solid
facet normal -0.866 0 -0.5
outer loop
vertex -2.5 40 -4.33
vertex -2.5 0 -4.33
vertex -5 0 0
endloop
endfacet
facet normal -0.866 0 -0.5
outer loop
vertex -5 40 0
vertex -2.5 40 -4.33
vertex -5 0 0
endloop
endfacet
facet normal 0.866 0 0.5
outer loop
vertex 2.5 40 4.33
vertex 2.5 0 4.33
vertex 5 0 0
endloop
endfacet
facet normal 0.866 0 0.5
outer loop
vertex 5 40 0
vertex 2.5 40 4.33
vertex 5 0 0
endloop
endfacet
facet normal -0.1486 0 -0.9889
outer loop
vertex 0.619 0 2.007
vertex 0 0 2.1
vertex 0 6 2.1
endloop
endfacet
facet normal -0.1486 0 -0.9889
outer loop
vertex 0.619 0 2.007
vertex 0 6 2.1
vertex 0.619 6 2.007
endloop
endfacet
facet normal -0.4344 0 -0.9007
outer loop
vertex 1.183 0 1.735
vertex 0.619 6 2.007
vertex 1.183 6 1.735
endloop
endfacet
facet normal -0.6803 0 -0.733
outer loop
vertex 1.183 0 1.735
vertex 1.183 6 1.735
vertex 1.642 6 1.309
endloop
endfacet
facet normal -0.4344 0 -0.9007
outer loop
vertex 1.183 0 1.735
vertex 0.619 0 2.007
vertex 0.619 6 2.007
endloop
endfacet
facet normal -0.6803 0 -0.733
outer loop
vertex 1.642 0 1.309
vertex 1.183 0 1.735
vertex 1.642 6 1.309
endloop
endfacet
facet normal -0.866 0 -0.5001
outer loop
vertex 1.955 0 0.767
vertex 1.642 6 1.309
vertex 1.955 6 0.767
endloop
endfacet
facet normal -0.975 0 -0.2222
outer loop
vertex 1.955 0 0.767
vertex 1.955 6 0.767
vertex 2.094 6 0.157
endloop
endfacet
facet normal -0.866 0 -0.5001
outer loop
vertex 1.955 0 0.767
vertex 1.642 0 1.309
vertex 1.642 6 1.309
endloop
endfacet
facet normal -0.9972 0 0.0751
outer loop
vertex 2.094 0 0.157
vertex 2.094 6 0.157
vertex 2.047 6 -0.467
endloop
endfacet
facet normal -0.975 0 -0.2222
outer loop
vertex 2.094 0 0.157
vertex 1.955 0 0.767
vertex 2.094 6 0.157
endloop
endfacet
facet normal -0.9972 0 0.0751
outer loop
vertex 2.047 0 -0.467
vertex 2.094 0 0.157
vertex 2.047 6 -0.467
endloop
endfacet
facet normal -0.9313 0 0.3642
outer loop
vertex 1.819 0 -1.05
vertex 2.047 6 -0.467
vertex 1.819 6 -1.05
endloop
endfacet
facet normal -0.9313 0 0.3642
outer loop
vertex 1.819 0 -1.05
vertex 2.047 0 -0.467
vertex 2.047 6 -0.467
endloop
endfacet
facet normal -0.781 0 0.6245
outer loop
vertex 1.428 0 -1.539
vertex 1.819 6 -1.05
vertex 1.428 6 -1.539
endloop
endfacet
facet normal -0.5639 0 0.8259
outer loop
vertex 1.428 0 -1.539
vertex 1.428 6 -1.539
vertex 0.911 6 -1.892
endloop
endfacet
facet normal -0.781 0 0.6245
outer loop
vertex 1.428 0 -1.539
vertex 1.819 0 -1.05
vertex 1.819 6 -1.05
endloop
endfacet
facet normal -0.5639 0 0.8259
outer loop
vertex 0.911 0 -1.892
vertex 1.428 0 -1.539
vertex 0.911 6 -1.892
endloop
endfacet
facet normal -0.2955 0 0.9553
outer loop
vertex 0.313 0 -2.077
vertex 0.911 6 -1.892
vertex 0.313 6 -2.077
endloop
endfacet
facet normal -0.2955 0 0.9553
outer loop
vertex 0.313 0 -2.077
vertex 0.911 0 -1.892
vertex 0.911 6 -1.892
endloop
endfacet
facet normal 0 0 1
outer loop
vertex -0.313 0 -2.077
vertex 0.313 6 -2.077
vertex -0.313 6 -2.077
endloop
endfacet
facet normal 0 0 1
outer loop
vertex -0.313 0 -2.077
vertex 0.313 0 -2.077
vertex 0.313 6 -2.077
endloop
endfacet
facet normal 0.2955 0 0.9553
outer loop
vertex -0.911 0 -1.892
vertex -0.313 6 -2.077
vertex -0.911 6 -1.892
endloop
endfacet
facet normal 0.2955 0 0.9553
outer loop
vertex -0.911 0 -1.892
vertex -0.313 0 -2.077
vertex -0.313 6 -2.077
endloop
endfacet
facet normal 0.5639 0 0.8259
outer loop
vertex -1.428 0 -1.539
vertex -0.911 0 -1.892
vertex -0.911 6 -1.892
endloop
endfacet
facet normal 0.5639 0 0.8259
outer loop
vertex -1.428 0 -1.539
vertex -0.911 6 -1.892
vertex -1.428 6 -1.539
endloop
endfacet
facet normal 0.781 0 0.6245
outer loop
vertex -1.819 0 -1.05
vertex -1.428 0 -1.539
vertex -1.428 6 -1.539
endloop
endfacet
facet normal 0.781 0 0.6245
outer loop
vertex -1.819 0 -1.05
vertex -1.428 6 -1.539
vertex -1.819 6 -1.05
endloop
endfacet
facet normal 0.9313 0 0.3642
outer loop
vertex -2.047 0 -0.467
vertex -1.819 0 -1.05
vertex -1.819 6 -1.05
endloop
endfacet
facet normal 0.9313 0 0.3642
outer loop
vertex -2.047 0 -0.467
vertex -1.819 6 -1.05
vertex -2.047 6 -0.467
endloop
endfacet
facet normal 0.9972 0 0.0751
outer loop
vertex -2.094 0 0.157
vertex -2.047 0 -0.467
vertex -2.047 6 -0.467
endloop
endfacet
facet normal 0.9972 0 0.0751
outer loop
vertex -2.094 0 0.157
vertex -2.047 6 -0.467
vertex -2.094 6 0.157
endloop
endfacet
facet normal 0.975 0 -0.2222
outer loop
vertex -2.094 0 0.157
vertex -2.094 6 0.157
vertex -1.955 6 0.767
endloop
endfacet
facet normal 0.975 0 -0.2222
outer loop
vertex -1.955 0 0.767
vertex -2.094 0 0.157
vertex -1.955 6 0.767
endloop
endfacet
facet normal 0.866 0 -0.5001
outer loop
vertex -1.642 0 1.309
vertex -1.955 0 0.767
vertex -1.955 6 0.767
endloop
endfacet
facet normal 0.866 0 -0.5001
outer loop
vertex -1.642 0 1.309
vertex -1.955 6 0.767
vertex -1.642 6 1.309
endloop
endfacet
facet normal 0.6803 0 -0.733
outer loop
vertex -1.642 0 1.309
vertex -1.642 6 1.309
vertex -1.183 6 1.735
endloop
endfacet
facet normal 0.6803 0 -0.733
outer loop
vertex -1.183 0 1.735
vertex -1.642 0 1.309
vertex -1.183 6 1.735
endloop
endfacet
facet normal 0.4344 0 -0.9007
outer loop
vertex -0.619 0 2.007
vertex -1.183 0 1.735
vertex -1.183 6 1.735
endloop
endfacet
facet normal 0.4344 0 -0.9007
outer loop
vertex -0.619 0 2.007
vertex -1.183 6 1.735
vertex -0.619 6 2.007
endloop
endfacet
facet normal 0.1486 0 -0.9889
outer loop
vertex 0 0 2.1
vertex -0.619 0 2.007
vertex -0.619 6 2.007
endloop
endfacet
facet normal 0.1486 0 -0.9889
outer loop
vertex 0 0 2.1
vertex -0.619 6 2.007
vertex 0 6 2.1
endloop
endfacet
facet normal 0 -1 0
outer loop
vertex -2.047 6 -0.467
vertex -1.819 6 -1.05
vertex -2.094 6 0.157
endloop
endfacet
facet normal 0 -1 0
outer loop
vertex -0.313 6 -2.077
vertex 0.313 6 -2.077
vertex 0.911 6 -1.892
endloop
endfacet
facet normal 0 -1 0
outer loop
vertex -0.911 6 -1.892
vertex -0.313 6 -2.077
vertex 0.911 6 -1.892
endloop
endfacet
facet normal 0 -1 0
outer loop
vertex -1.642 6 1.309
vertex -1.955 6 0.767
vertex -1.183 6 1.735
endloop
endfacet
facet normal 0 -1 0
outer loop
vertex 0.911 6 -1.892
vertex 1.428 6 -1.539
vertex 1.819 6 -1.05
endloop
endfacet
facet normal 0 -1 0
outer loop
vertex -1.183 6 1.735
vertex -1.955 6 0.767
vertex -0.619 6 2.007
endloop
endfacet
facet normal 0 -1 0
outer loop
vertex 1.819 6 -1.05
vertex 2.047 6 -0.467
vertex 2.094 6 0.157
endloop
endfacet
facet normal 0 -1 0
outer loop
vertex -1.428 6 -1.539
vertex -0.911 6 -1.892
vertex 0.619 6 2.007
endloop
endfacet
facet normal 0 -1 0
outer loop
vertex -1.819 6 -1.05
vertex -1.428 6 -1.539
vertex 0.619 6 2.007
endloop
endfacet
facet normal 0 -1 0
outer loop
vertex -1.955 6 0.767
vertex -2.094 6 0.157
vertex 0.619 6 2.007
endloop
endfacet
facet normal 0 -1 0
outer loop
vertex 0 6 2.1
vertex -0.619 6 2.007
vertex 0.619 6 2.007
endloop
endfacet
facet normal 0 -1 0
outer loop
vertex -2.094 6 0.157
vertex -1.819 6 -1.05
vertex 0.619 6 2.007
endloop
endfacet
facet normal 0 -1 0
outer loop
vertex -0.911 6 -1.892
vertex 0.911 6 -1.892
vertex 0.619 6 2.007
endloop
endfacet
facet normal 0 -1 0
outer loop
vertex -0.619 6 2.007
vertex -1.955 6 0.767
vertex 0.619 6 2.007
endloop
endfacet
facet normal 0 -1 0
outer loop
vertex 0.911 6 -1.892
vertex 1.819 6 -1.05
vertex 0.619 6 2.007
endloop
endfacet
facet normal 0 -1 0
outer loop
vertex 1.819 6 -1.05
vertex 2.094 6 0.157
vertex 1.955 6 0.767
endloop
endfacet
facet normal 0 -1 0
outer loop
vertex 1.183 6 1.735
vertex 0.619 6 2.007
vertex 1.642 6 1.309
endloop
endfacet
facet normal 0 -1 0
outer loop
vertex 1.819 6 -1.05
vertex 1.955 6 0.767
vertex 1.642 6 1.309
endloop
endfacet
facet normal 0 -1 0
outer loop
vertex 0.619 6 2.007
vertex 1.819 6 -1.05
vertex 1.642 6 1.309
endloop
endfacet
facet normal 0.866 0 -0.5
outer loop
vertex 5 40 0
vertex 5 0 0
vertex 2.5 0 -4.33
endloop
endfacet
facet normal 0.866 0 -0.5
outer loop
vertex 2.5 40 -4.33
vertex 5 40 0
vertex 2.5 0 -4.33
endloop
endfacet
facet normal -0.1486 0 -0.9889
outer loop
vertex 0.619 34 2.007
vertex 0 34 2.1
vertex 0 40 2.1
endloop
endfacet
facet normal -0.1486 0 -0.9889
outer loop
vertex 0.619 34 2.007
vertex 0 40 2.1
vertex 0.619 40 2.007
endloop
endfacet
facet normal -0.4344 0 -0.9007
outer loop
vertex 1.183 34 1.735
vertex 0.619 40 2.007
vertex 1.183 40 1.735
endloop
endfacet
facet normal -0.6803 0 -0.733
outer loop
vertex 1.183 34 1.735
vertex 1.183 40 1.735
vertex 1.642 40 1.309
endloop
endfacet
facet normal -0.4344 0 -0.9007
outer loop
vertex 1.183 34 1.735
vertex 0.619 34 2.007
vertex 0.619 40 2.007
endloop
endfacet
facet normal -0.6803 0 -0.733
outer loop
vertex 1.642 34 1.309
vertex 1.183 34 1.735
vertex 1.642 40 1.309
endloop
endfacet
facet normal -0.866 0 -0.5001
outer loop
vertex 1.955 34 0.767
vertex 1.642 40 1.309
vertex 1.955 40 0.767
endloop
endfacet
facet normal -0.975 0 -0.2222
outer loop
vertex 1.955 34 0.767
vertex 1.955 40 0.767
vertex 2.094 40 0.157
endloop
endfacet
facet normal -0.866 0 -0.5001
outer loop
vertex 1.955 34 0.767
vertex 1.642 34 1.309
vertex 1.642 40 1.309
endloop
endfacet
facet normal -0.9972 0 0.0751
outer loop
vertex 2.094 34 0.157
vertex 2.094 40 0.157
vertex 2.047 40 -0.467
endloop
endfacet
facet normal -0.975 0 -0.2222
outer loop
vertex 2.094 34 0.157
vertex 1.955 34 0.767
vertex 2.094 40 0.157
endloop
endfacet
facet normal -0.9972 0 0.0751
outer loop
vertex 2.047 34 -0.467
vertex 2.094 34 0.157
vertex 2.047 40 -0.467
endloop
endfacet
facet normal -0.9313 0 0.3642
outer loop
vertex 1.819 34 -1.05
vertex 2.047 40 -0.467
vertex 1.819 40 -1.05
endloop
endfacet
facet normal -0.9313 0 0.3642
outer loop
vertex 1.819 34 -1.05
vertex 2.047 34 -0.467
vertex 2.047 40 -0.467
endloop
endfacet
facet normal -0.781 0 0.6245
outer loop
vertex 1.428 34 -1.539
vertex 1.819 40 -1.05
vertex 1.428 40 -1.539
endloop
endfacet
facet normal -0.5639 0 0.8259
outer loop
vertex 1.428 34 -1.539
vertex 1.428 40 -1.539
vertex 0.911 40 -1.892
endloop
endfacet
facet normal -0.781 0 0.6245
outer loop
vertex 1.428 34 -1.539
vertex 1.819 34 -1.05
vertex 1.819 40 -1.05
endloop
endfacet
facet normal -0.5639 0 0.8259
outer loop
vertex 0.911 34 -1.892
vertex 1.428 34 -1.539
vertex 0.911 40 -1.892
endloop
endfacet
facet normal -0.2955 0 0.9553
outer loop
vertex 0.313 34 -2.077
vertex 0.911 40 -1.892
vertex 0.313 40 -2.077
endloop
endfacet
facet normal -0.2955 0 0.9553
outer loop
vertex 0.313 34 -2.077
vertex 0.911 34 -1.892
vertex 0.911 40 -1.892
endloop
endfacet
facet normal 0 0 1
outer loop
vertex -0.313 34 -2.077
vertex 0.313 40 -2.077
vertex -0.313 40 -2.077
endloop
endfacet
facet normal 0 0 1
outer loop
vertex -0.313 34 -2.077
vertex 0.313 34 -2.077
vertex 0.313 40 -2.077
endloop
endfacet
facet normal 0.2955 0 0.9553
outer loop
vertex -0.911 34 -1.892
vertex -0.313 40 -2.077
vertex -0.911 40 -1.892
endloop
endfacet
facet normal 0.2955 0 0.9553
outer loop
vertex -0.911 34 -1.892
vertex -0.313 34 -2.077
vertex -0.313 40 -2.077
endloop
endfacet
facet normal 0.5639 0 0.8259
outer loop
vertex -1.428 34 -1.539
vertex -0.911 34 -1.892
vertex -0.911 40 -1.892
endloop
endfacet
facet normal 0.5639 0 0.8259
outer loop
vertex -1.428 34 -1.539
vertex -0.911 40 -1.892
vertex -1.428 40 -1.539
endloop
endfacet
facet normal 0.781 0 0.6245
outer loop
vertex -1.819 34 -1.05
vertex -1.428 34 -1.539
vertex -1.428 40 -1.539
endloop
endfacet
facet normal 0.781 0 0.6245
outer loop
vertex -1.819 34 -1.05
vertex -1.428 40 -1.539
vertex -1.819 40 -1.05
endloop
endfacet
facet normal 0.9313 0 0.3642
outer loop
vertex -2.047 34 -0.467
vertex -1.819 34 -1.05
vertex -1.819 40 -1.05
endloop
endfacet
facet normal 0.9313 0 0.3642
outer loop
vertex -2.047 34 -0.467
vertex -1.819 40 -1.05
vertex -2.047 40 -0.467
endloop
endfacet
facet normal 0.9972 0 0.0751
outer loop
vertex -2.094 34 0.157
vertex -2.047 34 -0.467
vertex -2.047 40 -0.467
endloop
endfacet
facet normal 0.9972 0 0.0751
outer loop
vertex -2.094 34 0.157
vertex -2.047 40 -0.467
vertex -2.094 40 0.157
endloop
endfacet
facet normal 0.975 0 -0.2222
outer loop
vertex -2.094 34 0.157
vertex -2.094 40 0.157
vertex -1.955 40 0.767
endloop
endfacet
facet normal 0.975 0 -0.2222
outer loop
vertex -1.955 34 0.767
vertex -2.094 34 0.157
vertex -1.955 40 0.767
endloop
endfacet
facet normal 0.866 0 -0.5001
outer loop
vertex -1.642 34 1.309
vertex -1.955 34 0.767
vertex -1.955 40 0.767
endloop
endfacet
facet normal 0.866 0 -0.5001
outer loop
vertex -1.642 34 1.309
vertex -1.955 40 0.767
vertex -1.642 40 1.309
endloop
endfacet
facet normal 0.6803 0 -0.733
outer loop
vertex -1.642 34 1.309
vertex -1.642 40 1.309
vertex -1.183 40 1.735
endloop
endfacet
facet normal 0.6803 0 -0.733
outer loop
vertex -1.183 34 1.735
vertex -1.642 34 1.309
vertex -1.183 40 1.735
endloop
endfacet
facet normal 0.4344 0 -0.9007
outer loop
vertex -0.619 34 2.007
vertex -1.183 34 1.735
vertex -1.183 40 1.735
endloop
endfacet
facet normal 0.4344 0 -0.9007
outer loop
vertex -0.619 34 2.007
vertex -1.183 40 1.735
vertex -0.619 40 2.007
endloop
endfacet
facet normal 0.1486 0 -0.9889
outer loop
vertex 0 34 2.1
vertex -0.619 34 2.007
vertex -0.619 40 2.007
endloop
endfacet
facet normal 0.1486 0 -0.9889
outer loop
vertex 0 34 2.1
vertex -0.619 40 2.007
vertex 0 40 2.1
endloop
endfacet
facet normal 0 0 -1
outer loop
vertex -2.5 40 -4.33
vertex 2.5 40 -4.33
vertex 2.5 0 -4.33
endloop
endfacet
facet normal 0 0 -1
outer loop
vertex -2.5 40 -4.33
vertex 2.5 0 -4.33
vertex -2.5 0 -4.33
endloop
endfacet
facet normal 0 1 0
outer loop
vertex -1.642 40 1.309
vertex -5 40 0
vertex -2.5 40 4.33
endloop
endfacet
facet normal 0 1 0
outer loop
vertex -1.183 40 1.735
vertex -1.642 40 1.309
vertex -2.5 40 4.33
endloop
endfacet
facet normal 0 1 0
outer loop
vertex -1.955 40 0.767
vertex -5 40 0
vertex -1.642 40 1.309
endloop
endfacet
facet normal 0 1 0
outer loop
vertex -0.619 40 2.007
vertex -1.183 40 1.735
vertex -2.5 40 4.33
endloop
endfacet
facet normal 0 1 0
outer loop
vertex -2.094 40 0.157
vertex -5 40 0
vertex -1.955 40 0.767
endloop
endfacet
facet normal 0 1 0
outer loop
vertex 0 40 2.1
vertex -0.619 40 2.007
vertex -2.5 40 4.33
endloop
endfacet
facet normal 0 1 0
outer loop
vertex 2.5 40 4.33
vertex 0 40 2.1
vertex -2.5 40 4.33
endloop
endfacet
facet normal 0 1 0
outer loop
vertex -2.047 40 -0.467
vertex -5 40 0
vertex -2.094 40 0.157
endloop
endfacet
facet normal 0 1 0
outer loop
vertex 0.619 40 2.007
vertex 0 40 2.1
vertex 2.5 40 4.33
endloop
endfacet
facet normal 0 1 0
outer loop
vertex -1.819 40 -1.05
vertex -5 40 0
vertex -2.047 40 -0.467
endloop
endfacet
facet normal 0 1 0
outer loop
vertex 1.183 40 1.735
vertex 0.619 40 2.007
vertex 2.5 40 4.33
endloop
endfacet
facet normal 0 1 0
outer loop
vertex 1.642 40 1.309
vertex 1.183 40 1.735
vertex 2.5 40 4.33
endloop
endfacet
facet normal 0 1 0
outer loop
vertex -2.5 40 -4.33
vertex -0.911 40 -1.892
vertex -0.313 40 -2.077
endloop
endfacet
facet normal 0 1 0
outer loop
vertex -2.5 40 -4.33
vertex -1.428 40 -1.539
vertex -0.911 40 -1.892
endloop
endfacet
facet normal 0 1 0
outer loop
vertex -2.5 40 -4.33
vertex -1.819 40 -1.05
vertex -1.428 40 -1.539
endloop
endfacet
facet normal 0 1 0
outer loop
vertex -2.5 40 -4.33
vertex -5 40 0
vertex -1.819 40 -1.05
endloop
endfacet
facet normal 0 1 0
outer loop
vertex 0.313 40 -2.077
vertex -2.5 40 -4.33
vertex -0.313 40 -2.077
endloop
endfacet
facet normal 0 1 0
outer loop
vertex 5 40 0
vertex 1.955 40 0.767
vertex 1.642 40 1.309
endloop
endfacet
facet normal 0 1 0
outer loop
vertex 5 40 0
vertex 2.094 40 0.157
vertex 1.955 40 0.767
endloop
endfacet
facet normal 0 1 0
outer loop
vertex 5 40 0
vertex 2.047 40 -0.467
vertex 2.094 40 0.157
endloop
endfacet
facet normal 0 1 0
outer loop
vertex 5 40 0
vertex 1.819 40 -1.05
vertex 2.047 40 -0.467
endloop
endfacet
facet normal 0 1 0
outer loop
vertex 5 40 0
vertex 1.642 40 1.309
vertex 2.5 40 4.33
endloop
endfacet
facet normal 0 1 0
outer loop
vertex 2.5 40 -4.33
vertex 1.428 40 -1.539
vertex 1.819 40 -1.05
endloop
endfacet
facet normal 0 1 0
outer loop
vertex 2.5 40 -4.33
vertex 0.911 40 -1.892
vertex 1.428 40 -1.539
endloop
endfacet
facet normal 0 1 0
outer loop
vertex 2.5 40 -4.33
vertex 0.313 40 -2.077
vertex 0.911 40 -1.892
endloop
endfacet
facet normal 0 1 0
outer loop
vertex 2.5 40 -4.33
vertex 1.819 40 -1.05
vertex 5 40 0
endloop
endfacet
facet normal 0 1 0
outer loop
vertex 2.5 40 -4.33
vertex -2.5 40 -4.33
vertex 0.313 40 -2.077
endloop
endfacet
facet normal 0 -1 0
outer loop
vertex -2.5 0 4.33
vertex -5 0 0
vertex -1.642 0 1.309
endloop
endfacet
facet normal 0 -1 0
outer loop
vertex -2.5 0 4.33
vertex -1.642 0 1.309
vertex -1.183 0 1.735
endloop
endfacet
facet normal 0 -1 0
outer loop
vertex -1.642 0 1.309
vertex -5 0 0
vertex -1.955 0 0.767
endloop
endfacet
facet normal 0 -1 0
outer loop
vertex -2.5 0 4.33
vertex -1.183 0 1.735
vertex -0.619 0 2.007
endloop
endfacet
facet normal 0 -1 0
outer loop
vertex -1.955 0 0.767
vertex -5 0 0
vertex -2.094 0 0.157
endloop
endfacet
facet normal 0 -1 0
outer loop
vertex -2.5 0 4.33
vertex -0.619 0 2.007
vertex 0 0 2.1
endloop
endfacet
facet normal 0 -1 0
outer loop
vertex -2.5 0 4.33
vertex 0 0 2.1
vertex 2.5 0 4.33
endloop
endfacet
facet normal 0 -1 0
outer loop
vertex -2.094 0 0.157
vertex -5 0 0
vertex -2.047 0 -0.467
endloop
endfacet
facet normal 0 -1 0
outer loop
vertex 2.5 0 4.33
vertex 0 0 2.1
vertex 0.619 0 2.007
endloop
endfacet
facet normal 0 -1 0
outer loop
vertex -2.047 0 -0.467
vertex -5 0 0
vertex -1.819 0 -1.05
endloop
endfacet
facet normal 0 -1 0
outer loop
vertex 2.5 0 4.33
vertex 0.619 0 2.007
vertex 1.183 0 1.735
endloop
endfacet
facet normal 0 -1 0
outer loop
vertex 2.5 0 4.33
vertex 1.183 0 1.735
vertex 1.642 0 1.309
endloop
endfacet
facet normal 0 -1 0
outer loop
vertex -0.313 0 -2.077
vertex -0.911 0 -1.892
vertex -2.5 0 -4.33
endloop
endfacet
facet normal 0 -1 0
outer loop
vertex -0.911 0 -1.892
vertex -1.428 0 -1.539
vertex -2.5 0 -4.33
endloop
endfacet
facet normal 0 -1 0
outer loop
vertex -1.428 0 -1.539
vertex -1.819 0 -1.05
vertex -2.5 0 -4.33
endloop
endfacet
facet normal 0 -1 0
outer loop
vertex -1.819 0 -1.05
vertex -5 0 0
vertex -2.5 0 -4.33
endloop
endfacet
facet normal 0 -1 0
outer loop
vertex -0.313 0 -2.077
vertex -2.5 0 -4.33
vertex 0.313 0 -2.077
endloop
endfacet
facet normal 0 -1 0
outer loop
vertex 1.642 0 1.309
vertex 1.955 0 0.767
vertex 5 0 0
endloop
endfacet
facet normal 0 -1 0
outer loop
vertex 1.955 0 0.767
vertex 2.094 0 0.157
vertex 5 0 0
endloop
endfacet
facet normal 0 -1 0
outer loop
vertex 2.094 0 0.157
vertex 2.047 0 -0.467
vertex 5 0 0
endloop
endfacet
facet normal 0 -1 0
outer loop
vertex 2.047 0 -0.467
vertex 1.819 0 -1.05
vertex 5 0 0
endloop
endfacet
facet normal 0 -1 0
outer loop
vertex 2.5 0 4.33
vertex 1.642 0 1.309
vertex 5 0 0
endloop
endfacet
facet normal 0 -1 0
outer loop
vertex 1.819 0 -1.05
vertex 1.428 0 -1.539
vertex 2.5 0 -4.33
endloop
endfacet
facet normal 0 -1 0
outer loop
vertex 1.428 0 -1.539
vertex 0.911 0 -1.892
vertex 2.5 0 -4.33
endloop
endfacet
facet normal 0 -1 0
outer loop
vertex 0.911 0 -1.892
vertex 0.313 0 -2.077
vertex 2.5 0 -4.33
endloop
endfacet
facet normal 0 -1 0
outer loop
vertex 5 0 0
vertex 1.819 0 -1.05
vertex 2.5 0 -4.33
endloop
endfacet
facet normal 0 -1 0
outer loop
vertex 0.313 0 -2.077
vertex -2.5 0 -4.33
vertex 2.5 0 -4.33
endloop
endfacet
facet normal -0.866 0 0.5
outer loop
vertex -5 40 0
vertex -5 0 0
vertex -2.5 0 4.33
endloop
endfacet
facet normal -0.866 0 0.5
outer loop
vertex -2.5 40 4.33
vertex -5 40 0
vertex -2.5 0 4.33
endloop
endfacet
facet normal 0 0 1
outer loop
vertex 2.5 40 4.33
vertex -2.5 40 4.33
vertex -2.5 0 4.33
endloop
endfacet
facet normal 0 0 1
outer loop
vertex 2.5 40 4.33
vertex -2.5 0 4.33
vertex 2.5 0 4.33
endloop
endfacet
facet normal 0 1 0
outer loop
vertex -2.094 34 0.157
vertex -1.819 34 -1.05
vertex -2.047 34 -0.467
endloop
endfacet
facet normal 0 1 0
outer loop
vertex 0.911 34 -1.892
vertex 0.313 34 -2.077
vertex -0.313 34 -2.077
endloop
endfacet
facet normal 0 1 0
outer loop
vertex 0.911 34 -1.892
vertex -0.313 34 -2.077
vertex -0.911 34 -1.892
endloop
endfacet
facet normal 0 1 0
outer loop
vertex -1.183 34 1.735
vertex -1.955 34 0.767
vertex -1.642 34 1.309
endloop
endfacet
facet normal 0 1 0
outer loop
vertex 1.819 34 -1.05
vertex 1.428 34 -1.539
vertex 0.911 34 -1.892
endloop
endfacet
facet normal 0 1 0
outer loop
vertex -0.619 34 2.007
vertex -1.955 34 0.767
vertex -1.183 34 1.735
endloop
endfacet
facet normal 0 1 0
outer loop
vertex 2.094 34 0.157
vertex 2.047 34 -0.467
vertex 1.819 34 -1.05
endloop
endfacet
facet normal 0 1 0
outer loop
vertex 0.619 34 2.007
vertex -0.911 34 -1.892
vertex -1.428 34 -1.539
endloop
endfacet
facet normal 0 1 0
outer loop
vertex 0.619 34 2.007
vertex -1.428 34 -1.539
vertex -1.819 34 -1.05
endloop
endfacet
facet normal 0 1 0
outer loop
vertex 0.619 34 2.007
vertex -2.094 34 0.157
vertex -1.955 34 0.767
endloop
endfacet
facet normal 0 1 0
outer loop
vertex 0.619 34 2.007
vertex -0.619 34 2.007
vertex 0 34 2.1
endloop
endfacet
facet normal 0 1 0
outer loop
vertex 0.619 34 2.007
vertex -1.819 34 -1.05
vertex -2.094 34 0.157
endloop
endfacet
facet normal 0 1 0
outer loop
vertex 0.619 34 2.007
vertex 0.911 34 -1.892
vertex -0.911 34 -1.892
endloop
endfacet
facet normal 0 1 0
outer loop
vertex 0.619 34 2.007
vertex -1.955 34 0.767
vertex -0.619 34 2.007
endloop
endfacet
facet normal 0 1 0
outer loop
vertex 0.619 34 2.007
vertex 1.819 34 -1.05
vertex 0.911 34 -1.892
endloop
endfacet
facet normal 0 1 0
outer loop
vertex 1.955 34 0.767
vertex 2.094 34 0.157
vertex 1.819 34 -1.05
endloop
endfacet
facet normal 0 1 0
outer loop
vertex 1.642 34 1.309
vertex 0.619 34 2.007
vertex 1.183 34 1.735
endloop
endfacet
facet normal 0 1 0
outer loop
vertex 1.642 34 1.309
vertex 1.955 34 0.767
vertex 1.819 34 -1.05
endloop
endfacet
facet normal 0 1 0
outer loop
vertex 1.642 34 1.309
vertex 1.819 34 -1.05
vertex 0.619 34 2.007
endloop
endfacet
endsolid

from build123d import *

# Parameters (mm, degrees)
SKETCH1_R                = 2.1
BOSS_EXTRUDE1_DEPTH      = 40
BOSS_EXTRUDE3_DEPTH      = 14
BOSS_EXTRUDE3_DEPTH_BACK = 14
SKETCH2_R                = 2.1


with BuildPart() as part:
    # Sketch1 → Boss-Extrude1 (new body)
    with BuildSketch(Plane(origin=(0, 0, 0), x_dir=(1, 0, 0), z_dir=(0, 1, 0))):
        Polygon((5, 0), (2.5, 4.330127019), (-2.5, 4.330127019), (-5, 0), (-2.5, -4.330127019), (2.5, -4.330127019), align=None)
        with Locations(Location((0, 0, 0), (0, 0, 270))):
            Circle(SKETCH1_R, mode=Mode.SUBTRACT)
    extrude(amount=BOSS_EXTRUDE1_DEPTH)

    # Sketch2 → Boss-Extrude3 (add, two sides: drawn at the far end of the back side and taken through both)
    with BuildSketch(Plane(origin=(0, 20, 0), x_dir=(1, 0, 0), z_dir=(0, 1, 0)).offset(-BOSS_EXTRUDE3_DEPTH_BACK)):
        with Locations(Location((0, 0, 0), (0, 0, 270))):
            Circle(SKETCH2_R)
    extrude(amount=BOSS_EXTRUDE3_DEPTH + BOSS_EXTRUDE3_DEPTH_BACK)


solid = part.part
